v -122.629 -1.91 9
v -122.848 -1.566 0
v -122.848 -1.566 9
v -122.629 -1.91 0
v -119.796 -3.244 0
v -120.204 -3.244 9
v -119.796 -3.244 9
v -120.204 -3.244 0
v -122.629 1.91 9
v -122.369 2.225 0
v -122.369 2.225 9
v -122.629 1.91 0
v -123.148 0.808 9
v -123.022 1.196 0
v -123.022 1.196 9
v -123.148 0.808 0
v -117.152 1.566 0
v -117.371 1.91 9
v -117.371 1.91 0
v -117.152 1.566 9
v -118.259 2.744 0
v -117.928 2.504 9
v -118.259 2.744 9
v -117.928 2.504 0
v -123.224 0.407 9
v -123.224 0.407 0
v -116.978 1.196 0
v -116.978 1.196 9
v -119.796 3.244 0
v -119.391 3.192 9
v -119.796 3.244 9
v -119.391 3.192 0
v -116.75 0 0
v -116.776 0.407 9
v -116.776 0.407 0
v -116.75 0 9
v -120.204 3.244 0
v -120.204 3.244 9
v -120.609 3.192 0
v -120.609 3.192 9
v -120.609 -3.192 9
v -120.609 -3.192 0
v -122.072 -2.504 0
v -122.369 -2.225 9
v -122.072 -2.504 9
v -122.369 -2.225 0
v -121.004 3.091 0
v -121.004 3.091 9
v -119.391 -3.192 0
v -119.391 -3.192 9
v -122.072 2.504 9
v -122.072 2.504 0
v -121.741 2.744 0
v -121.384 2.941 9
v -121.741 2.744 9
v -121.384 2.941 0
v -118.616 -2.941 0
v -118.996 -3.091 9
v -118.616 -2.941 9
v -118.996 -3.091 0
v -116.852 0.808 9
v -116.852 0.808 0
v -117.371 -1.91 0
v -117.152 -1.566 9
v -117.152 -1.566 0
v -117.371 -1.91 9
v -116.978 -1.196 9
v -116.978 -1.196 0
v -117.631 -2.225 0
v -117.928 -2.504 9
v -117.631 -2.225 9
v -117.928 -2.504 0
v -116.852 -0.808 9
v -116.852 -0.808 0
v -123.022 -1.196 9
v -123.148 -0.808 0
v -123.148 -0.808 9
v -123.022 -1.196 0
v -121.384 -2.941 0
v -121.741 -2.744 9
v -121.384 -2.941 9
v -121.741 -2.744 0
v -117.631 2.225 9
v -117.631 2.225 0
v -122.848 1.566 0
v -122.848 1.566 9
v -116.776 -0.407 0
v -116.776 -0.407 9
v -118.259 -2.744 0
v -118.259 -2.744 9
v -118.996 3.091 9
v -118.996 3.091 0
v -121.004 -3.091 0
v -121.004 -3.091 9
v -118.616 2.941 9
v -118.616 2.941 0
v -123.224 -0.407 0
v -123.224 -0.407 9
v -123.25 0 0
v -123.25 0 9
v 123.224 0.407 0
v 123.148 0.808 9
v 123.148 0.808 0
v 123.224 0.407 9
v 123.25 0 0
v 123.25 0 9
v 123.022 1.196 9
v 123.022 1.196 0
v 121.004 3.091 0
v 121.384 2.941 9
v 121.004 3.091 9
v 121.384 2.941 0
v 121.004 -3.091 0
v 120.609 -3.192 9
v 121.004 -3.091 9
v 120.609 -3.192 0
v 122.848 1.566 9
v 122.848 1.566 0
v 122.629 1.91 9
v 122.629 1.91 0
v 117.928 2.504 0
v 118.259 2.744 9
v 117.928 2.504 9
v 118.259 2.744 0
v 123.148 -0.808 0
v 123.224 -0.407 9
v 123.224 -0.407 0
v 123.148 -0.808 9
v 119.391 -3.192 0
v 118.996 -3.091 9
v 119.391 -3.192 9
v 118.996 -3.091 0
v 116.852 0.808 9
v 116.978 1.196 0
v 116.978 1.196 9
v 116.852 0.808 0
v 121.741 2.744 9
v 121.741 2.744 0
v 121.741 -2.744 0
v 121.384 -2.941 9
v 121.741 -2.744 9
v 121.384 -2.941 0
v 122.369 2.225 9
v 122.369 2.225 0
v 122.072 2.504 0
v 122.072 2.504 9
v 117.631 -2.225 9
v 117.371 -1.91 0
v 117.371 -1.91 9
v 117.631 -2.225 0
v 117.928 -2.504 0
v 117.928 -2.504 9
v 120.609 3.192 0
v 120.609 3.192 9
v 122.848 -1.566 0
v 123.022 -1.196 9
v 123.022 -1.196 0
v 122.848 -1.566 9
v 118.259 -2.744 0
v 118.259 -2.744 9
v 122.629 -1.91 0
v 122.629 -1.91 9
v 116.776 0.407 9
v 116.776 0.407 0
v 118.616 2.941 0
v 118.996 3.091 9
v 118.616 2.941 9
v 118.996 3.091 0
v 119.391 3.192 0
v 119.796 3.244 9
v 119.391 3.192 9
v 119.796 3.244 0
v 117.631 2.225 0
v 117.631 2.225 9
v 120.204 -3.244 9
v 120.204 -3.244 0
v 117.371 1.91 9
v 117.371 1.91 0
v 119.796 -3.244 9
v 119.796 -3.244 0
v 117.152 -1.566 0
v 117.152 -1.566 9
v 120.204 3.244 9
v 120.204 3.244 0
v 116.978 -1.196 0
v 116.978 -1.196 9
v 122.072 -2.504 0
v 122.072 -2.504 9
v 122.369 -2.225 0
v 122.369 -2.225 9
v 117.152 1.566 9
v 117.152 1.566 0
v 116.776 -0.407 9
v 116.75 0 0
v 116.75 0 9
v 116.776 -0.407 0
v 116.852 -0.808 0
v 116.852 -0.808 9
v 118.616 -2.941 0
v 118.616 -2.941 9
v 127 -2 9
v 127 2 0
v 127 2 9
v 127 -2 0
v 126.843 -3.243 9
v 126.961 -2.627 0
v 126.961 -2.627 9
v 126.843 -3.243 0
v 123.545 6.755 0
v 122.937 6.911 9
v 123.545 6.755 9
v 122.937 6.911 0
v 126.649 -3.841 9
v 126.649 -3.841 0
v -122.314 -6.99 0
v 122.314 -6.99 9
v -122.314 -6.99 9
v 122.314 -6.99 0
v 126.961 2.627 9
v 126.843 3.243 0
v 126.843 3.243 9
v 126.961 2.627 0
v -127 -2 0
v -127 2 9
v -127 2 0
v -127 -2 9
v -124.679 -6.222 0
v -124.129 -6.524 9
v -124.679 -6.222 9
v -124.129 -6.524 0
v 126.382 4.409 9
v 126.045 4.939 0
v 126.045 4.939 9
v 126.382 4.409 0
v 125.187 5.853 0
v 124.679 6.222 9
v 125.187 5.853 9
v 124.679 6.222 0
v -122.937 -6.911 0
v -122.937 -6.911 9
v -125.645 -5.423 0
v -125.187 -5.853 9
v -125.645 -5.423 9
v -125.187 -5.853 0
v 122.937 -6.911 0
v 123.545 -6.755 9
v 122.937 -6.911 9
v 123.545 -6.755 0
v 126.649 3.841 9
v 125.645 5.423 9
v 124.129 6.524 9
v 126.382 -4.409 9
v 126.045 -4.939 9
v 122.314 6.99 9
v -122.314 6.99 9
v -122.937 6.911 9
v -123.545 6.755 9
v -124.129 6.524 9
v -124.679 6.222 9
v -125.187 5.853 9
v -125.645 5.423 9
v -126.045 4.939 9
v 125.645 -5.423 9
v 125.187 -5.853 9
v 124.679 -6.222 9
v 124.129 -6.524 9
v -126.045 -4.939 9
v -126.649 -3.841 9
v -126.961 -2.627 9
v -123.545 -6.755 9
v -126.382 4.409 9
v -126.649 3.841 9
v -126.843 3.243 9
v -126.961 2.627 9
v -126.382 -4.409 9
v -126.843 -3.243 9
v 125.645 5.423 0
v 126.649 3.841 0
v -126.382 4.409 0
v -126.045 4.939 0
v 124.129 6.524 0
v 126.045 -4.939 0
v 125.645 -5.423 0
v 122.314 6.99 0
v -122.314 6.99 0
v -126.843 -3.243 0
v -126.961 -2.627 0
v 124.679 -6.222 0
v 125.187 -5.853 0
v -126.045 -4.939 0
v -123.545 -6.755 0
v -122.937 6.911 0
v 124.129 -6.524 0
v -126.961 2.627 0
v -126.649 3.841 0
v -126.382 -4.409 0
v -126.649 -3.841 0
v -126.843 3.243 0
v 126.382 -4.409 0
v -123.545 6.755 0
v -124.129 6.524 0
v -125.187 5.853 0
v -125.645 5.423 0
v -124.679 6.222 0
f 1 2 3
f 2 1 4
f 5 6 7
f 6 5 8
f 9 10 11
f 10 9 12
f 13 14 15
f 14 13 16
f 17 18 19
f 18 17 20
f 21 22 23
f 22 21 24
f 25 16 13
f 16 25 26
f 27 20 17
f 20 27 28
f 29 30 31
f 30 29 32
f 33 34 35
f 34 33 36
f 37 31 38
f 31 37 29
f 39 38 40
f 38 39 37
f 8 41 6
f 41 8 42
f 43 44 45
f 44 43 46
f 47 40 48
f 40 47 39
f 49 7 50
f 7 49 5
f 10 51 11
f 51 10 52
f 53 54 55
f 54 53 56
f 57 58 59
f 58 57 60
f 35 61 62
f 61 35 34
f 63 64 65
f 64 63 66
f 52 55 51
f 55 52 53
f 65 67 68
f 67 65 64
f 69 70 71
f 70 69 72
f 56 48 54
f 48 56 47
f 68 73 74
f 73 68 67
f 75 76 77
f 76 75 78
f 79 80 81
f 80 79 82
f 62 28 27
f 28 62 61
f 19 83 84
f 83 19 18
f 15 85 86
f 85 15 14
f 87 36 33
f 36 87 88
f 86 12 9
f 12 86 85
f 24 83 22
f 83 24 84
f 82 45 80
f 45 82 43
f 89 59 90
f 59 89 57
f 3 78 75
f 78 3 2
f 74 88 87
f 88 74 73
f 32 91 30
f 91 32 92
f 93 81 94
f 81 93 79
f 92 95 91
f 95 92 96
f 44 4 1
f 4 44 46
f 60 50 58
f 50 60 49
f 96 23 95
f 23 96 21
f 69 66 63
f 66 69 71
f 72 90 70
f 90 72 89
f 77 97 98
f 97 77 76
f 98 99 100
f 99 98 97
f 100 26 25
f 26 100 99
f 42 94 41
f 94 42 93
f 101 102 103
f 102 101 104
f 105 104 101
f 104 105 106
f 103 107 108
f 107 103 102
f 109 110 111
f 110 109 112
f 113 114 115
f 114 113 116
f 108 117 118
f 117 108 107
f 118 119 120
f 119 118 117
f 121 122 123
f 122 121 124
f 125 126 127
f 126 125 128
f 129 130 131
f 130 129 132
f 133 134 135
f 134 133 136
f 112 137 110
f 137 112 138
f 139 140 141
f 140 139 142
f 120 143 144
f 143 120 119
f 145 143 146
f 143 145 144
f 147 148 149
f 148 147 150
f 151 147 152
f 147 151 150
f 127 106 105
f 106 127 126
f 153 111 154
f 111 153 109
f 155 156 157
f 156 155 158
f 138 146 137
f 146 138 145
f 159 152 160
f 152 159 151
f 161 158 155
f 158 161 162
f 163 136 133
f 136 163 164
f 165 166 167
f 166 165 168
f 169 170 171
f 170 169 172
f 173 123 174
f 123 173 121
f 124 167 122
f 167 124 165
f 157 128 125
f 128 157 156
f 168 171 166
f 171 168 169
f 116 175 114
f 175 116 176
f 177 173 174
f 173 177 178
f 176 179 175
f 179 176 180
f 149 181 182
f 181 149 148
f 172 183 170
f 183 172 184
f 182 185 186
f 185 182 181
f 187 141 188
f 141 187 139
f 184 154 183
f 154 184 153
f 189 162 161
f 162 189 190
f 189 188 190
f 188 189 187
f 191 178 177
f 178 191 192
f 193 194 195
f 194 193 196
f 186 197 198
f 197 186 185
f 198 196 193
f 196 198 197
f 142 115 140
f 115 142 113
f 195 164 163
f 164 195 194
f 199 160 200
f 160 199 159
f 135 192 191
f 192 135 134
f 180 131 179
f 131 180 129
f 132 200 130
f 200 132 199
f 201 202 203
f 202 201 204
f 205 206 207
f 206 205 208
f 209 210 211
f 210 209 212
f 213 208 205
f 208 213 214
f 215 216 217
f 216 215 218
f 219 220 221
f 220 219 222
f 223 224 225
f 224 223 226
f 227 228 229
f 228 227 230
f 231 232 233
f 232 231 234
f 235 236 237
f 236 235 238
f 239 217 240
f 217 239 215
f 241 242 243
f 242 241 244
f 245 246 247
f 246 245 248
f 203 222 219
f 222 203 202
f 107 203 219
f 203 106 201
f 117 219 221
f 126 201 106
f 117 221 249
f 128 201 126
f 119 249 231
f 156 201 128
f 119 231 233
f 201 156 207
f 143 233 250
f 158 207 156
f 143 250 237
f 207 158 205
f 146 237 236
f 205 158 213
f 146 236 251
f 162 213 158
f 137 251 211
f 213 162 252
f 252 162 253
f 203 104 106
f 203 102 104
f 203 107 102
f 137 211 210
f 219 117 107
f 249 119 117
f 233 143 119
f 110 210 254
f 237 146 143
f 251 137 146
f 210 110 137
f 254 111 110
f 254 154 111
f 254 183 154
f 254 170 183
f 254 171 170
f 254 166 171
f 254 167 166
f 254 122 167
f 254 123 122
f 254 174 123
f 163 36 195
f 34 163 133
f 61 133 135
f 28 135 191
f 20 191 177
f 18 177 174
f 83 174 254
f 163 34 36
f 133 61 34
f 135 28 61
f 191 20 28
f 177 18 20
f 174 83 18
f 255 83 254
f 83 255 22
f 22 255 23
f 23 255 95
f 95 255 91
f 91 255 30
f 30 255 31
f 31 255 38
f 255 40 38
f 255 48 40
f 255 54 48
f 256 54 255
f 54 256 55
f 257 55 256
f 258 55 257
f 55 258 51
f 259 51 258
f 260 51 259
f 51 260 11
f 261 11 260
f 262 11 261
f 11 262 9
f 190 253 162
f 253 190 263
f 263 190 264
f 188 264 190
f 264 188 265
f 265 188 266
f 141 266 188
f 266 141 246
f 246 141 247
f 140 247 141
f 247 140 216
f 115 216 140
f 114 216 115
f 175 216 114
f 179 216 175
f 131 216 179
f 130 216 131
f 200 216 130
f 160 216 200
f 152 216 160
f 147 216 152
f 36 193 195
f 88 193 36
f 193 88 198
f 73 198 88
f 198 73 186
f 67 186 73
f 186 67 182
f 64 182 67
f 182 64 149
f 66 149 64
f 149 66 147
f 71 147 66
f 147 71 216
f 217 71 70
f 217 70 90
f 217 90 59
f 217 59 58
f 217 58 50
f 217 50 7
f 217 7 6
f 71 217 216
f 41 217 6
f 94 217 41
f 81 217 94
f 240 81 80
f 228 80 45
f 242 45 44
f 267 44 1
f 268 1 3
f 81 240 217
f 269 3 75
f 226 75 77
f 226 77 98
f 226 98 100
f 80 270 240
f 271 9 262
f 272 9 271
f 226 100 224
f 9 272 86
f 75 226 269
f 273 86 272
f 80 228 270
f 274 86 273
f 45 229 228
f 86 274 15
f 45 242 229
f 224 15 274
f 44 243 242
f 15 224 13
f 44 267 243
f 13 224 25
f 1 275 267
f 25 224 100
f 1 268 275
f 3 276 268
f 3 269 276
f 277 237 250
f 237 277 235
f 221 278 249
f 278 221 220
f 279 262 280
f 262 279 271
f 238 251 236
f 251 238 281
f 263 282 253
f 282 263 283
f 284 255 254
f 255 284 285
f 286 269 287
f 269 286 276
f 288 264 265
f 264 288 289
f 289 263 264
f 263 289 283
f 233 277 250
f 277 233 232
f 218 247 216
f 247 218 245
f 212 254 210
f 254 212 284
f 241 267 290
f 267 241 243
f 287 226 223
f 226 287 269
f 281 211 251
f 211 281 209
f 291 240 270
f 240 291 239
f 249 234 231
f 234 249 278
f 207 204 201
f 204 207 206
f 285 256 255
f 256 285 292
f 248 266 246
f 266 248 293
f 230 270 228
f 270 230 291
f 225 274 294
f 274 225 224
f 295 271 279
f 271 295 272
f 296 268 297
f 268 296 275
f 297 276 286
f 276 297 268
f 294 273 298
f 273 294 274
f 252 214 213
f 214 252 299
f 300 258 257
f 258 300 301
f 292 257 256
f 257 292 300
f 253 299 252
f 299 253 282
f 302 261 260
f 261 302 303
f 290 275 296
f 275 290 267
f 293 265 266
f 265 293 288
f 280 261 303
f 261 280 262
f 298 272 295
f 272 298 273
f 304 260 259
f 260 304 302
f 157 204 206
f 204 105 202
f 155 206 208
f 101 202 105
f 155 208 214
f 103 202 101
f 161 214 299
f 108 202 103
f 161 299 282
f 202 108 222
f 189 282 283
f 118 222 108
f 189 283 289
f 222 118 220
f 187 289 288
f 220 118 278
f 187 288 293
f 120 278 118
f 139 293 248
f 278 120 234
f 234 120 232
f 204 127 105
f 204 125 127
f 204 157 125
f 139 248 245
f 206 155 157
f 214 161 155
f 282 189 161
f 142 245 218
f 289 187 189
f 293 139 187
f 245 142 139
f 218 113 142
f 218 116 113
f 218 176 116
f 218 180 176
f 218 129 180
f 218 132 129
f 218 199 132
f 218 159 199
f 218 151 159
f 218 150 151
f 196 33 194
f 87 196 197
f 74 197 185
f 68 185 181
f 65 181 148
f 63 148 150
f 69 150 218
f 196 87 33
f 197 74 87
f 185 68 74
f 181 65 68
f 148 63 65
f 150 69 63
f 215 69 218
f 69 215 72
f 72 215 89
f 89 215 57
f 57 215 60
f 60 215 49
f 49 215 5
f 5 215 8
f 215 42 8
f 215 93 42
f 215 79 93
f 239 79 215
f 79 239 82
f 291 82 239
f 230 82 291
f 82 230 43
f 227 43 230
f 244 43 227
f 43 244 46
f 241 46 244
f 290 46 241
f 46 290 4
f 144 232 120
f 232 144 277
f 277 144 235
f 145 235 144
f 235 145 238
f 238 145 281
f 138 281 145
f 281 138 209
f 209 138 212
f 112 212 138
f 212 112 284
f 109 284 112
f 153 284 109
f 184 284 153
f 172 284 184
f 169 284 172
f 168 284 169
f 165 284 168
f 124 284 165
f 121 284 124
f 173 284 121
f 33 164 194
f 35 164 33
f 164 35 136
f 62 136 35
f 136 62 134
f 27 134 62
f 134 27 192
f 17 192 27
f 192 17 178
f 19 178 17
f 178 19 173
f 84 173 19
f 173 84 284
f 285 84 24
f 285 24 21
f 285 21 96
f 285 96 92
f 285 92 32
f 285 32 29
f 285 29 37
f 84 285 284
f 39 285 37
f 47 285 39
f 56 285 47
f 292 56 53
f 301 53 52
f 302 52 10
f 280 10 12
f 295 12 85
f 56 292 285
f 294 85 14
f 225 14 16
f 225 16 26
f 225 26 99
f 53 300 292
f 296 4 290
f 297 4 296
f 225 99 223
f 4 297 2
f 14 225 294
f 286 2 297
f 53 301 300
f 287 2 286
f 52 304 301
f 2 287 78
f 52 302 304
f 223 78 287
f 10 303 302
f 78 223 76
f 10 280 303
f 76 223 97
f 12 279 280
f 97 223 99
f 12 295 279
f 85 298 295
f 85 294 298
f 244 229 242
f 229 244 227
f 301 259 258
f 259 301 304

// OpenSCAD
$fn = 50;


difference() {
	union() {
		hull() {
			translate(v = [-122.0000000000, 2.0000000000, 0]) {
				cylinder(h = 9, r = 5);
			}
			translate(v = [122.0000000000, 2.0000000000, 0]) {
				cylinder(h = 9, r = 5);
			}
			translate(v = [-122.0000000000, -2.0000000000, 0]) {
				cylinder(h = 9, r = 5);
			}
			translate(v = [122.0000000000, -2.0000000000, 0]) {
				cylinder(h = 9, r = 5);
			}
		}
	}
	union() {
		translate(v = [-120.0000000000, 0.0000000000, -100.0000000000]) {
			cylinder(h = 200, r = 3.2500000000);
		}
		translate(v = [-120.0000000000, 0.0000000000, -100.0000000000]) {
			cylinder(h = 200, r = 3.2500000000);
		}
		translate(v = [120.0000000000, 0.0000000000, -100.0000000000]) {
			cylinder(h = 200, r = 3.2500000000);
		}
		translate(v = [120.0000000000, 0.0000000000, -100.0000000000]) {
			cylinder(h = 200, r = 3.2500000000);
		}
	}
}
